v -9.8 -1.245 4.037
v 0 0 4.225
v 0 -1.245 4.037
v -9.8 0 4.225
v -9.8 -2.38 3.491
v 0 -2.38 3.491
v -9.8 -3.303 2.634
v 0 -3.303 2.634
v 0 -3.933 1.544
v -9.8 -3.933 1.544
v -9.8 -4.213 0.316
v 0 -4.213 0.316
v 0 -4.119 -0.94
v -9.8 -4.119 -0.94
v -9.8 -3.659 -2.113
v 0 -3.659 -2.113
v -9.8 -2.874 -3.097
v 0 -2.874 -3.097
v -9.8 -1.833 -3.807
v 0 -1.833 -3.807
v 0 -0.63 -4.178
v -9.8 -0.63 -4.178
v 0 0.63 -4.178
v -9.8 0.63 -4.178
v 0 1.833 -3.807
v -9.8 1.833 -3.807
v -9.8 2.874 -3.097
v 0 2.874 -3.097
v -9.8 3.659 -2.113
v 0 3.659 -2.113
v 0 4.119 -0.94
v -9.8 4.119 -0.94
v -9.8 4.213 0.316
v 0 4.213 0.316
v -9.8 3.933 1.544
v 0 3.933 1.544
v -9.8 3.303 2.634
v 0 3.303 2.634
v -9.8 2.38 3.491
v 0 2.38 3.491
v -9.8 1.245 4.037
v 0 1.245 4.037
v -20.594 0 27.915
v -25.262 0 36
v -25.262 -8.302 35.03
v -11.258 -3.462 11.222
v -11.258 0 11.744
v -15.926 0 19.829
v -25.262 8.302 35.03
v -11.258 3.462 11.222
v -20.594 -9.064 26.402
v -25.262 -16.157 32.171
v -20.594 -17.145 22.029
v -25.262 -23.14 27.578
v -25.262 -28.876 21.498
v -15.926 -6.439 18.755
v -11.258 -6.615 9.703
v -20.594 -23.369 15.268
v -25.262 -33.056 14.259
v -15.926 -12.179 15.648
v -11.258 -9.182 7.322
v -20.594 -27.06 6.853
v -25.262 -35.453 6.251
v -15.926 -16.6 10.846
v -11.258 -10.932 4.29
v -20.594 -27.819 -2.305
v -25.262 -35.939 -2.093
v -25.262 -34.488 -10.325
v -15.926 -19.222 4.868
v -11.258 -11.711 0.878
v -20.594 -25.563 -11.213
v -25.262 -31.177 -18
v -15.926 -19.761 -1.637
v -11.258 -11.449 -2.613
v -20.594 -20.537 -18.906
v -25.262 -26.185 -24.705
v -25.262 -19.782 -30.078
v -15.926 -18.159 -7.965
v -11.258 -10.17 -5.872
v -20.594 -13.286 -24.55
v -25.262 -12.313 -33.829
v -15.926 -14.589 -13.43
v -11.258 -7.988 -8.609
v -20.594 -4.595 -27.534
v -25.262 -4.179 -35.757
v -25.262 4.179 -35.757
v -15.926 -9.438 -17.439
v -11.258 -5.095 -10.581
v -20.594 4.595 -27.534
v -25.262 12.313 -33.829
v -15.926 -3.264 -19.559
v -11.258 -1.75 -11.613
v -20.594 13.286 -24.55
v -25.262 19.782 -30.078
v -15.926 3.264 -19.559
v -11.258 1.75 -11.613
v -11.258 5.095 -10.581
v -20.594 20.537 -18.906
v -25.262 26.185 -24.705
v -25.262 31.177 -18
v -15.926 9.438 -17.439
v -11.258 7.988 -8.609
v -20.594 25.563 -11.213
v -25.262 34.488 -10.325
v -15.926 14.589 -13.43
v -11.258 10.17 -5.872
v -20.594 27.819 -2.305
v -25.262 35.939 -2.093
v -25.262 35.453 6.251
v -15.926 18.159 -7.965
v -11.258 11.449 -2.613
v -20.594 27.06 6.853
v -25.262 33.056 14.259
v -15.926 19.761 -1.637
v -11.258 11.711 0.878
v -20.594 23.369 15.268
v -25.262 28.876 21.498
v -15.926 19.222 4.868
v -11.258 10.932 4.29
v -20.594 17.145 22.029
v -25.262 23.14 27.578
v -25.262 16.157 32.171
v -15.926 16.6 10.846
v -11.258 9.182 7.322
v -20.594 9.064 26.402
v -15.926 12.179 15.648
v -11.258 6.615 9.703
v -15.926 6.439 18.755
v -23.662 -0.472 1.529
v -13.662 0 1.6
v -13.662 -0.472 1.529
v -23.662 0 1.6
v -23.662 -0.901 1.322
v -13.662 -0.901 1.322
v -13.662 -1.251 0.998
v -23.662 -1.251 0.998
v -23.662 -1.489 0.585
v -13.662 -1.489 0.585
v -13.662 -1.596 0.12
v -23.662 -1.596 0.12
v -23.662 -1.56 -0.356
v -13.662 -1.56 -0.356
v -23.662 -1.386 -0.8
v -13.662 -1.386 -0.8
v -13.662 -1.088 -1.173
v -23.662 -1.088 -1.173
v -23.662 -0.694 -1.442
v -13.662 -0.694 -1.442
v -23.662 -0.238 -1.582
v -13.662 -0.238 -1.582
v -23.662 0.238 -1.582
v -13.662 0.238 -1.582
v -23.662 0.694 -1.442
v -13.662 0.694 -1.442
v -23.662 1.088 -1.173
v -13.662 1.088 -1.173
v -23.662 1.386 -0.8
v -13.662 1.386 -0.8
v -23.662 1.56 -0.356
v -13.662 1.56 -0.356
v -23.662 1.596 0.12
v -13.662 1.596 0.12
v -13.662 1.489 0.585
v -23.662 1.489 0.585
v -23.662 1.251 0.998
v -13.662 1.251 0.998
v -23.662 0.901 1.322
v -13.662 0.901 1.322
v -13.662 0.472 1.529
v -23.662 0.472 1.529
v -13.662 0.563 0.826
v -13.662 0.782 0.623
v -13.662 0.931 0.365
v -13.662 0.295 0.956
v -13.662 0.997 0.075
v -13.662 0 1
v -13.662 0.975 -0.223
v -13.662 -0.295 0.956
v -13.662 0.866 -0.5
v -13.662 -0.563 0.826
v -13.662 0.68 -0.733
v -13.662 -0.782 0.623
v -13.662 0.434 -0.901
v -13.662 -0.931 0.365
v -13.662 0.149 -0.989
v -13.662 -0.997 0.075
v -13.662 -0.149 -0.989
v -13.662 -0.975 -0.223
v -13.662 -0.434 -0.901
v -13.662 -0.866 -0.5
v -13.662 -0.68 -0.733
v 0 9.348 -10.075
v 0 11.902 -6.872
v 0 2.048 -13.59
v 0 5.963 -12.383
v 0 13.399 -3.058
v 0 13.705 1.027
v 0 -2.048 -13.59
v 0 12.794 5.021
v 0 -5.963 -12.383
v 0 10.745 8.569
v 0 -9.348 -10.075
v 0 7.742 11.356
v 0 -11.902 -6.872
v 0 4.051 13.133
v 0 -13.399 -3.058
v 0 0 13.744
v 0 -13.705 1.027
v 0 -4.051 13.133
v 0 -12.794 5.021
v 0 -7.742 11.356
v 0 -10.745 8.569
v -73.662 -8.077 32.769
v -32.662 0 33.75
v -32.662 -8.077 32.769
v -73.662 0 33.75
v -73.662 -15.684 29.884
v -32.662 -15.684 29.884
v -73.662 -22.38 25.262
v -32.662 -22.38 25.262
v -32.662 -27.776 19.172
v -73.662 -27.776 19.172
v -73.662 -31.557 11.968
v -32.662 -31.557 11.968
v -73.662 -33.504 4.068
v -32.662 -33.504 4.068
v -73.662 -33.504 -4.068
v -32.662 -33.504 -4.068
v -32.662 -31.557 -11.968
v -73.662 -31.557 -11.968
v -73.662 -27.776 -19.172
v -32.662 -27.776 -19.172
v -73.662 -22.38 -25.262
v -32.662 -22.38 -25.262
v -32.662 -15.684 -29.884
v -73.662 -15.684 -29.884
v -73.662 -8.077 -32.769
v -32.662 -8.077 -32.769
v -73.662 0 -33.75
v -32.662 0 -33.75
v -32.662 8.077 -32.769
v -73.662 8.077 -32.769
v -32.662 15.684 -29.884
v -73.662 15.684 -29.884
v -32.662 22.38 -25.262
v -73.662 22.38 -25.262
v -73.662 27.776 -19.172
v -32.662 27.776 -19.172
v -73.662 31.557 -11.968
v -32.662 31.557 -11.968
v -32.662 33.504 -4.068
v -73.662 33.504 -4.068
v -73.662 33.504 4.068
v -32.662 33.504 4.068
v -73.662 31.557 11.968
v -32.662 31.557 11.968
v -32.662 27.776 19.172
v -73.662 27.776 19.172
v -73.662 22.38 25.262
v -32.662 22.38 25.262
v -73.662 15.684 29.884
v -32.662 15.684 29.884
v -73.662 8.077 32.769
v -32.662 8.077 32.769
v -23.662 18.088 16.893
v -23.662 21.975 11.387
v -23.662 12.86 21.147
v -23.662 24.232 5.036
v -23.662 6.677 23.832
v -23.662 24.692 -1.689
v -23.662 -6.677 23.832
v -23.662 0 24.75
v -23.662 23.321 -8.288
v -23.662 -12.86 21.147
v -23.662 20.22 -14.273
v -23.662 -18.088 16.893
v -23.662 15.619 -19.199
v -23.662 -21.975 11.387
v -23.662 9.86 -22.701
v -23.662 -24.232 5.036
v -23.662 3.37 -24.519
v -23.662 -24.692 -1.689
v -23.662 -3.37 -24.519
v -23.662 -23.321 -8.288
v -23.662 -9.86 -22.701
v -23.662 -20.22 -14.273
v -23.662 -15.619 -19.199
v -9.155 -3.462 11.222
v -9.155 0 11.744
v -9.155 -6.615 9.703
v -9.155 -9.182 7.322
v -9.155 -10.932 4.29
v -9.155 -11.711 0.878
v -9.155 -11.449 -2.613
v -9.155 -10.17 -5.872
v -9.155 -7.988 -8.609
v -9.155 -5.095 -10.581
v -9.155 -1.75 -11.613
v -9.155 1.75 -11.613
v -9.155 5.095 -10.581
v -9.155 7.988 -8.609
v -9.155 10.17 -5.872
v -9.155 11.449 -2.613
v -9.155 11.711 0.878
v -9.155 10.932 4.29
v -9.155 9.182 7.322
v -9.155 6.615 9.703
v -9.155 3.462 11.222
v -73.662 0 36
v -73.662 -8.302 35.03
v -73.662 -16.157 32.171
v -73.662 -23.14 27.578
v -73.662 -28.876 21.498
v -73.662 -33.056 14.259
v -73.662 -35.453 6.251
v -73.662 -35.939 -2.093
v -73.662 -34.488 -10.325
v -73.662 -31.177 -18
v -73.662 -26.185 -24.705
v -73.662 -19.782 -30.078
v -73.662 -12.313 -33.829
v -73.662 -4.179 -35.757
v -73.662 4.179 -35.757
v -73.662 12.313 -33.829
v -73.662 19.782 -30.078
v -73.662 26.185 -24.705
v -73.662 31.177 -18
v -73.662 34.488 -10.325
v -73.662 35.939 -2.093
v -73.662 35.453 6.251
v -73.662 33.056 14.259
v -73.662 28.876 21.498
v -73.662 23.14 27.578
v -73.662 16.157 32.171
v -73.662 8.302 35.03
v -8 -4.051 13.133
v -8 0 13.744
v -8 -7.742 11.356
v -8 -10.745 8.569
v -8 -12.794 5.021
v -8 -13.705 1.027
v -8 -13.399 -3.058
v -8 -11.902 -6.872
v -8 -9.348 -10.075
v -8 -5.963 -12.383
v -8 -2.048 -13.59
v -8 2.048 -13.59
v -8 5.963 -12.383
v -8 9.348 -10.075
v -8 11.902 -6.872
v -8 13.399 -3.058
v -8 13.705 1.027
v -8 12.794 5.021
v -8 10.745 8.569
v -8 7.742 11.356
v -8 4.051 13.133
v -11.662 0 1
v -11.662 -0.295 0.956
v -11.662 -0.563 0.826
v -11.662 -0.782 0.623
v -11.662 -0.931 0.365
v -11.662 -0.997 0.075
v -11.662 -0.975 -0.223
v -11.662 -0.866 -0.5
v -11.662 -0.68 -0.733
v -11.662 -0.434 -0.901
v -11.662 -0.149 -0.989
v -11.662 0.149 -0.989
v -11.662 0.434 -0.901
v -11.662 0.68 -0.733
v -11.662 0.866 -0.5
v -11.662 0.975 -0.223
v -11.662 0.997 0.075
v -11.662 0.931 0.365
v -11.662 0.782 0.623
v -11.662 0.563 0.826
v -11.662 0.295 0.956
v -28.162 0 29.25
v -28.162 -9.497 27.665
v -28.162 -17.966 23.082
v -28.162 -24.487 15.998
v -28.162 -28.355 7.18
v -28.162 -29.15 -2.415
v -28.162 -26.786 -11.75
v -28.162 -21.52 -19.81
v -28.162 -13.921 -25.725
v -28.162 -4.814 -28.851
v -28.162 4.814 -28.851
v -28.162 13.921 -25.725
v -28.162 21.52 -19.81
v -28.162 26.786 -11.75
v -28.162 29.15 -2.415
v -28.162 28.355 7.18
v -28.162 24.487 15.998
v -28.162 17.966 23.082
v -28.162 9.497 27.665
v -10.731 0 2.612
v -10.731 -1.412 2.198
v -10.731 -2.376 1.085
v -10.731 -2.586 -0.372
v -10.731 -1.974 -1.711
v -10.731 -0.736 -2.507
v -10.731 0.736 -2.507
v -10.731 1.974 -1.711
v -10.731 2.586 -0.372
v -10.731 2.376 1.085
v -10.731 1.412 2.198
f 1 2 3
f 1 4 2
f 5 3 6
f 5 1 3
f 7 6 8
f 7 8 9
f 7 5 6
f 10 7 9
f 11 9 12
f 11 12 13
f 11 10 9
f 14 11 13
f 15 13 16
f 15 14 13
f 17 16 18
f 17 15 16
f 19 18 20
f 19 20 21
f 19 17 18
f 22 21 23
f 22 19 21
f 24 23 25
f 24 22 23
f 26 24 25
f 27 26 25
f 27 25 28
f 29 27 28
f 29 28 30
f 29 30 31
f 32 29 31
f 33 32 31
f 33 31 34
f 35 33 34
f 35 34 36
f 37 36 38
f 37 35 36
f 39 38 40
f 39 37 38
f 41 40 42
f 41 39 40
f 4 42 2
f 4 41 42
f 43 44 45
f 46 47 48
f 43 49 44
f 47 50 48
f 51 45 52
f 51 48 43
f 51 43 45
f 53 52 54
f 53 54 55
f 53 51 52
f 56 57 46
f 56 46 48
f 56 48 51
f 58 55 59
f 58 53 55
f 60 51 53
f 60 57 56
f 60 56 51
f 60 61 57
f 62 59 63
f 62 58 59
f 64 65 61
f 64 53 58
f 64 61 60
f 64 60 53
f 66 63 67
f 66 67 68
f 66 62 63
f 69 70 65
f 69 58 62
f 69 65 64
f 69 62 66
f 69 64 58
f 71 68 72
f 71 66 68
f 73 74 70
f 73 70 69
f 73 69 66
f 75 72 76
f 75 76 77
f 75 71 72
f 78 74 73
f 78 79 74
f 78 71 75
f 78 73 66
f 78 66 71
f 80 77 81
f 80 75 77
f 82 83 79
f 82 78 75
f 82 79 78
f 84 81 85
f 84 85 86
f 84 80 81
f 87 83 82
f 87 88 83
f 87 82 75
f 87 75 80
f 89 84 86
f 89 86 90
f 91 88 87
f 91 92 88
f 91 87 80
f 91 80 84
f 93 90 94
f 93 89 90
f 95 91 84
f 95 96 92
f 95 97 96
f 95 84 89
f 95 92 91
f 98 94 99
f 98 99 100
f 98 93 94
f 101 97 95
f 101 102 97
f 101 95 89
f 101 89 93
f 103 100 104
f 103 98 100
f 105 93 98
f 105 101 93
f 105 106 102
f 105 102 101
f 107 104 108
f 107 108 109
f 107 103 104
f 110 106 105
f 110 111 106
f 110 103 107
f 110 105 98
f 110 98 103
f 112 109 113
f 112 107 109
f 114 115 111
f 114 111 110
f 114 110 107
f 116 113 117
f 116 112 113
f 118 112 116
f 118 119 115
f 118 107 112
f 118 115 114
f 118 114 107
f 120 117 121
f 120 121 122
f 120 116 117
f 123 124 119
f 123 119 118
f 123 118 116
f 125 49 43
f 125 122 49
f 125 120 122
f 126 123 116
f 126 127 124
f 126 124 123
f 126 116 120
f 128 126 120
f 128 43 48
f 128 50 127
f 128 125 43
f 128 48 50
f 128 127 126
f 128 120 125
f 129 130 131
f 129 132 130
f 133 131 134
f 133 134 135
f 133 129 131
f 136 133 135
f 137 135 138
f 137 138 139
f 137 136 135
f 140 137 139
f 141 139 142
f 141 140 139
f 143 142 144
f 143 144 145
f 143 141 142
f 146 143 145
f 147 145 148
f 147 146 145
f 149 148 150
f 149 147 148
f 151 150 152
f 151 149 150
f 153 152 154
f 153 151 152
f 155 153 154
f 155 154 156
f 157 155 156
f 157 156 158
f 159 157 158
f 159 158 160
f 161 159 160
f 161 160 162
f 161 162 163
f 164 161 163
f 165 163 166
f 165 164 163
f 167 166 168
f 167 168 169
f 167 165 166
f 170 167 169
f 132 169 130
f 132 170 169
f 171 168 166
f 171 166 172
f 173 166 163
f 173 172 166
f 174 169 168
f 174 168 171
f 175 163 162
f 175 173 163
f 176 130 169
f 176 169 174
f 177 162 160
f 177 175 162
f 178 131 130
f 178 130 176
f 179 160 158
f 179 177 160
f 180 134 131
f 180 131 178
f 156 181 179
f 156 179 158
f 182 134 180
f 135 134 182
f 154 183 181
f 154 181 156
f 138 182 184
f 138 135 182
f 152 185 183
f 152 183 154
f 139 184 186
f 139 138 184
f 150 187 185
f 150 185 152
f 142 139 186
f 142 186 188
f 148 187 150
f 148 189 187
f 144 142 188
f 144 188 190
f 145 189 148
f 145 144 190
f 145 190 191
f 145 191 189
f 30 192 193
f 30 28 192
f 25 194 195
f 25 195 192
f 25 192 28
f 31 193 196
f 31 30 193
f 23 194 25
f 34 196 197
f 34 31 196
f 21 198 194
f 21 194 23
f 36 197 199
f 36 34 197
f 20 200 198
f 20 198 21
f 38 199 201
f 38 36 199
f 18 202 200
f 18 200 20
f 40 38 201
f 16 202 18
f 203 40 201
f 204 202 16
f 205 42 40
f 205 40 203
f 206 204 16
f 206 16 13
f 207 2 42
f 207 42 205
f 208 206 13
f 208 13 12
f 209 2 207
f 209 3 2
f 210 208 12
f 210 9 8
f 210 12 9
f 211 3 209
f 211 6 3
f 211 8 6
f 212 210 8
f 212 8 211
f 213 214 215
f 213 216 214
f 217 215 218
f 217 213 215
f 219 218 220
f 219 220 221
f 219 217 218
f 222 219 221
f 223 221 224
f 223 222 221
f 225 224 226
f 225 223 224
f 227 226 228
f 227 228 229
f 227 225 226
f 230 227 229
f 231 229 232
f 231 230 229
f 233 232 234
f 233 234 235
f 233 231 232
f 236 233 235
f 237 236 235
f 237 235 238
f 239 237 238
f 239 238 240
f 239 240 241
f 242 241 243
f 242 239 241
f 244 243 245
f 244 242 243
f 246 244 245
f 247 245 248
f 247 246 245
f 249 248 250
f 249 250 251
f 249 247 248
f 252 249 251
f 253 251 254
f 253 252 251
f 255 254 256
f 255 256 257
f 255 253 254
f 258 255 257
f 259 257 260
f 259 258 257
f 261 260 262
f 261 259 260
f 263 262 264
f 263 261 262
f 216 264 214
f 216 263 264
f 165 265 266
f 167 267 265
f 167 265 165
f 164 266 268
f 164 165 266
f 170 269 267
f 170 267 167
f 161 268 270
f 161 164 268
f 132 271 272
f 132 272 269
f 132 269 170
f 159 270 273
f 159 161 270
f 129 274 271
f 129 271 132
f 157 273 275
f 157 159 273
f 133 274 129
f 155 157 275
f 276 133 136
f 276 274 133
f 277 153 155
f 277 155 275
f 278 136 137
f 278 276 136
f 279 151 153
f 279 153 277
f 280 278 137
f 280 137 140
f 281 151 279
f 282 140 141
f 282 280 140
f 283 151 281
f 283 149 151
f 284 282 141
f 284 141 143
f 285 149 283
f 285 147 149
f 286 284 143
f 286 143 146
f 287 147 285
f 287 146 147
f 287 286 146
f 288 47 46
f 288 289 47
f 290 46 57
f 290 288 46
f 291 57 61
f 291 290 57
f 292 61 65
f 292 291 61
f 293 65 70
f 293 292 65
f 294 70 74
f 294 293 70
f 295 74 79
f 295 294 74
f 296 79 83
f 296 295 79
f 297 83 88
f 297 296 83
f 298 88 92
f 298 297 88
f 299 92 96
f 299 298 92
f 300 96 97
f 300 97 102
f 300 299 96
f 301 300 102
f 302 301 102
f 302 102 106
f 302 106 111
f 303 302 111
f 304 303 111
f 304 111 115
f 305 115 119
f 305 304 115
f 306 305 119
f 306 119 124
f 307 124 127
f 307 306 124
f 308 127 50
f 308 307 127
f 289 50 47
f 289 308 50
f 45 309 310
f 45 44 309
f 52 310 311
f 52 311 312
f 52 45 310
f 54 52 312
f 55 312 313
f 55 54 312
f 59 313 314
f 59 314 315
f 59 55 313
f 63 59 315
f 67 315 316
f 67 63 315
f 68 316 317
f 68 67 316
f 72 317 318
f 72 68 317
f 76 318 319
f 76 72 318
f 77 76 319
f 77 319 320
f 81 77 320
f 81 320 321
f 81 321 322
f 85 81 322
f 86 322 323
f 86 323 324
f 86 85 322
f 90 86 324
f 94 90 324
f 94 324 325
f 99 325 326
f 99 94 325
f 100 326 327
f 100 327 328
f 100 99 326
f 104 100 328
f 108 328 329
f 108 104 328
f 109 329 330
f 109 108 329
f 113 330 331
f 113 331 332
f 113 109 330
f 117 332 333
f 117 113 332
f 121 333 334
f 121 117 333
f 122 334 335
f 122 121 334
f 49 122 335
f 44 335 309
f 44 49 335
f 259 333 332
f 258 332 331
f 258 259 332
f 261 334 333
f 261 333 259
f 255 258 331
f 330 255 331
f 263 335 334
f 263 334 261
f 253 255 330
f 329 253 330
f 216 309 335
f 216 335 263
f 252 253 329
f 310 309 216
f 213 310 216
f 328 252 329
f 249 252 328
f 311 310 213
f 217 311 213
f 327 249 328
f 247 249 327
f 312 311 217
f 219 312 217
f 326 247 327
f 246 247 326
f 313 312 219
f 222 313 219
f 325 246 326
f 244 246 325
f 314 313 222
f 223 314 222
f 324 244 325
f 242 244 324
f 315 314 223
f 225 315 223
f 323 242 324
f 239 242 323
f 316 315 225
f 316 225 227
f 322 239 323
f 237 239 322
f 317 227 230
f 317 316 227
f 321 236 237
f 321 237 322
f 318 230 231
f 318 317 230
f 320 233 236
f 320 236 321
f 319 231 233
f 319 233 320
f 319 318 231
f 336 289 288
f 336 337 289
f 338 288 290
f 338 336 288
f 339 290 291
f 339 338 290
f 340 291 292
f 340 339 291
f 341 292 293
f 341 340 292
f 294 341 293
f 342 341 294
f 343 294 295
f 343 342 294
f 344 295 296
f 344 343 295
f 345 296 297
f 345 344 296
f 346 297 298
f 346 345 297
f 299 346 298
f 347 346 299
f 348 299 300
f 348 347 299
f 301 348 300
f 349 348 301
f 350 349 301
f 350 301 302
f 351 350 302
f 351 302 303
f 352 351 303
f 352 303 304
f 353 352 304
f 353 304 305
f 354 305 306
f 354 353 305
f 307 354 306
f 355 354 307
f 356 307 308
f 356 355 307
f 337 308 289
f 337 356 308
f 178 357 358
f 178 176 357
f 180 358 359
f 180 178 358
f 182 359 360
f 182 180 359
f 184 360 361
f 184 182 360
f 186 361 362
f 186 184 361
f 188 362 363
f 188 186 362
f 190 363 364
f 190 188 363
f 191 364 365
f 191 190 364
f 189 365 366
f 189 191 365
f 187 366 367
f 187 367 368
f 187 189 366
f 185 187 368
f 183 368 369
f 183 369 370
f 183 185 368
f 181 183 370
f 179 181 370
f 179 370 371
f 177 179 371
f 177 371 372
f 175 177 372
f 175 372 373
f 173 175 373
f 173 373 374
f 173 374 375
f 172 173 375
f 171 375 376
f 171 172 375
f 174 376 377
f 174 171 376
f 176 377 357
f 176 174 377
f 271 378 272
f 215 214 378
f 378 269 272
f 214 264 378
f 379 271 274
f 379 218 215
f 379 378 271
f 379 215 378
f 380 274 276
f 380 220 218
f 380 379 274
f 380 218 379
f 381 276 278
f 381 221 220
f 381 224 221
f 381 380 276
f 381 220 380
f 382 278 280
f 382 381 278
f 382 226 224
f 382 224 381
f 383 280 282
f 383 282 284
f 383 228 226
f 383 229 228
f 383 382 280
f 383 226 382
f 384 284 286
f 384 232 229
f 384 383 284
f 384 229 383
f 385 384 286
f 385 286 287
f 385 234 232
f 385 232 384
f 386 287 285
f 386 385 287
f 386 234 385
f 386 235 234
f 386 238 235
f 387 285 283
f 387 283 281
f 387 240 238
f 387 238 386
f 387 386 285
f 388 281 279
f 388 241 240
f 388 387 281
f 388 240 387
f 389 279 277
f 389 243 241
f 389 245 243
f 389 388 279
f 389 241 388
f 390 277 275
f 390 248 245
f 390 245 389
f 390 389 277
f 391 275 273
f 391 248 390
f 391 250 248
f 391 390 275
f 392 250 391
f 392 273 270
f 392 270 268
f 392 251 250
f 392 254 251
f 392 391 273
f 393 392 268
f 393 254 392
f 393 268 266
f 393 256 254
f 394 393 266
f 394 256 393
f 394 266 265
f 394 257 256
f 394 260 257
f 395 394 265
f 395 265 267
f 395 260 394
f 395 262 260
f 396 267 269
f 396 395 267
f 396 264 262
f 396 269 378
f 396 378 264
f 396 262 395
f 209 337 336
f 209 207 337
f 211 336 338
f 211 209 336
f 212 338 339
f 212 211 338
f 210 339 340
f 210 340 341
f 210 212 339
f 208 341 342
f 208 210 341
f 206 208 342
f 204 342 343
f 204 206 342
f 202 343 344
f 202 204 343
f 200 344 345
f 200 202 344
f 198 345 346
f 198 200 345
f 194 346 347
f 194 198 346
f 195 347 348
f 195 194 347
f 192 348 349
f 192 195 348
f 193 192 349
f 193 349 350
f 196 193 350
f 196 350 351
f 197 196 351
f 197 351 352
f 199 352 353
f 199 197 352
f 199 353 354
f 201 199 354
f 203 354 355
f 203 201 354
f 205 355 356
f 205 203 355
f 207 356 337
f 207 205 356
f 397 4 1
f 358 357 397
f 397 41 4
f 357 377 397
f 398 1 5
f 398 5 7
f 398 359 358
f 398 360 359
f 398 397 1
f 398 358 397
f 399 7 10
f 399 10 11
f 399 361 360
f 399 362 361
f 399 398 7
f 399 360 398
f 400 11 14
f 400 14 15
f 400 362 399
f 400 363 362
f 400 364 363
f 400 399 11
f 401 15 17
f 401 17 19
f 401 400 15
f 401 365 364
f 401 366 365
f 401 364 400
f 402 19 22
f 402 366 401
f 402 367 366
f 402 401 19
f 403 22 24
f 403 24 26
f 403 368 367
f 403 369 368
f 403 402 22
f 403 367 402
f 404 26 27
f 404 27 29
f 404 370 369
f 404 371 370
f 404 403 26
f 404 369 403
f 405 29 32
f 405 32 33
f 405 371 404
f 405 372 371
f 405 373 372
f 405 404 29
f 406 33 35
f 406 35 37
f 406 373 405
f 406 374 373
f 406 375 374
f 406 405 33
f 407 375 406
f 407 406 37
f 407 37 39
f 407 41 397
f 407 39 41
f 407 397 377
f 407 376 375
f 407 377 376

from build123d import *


with BuildPart() as part:
    # Sketch1 → Revolve1 (revolve)
    with BuildSketch(Plane(origin=(0, 0, 0), x_dir=(1, 0, 0), z_dir=(0, 1, 0))):
        Polygon((-73.661954618, 36), (-25.262429889, 36), (-11.25804845, 11.743699818), (-9.154700538, 11.743699818), (-8, 13.743699818), (0, 13.743699818), (0, 4.225), (-9.8, 4.225), (-11.661954618, 1), (-13.661954618, 1), (-13.661954618, 1.6), (-23.661954618, 1.6), (-23.661954618, 24.75), (-32.661954618, 33.75), (-73.661954618, 33.75), align=None)
    revolve(axis=Axis((-73.661954618, 0, 0), (1, 0, 0)))


solid = part.part
